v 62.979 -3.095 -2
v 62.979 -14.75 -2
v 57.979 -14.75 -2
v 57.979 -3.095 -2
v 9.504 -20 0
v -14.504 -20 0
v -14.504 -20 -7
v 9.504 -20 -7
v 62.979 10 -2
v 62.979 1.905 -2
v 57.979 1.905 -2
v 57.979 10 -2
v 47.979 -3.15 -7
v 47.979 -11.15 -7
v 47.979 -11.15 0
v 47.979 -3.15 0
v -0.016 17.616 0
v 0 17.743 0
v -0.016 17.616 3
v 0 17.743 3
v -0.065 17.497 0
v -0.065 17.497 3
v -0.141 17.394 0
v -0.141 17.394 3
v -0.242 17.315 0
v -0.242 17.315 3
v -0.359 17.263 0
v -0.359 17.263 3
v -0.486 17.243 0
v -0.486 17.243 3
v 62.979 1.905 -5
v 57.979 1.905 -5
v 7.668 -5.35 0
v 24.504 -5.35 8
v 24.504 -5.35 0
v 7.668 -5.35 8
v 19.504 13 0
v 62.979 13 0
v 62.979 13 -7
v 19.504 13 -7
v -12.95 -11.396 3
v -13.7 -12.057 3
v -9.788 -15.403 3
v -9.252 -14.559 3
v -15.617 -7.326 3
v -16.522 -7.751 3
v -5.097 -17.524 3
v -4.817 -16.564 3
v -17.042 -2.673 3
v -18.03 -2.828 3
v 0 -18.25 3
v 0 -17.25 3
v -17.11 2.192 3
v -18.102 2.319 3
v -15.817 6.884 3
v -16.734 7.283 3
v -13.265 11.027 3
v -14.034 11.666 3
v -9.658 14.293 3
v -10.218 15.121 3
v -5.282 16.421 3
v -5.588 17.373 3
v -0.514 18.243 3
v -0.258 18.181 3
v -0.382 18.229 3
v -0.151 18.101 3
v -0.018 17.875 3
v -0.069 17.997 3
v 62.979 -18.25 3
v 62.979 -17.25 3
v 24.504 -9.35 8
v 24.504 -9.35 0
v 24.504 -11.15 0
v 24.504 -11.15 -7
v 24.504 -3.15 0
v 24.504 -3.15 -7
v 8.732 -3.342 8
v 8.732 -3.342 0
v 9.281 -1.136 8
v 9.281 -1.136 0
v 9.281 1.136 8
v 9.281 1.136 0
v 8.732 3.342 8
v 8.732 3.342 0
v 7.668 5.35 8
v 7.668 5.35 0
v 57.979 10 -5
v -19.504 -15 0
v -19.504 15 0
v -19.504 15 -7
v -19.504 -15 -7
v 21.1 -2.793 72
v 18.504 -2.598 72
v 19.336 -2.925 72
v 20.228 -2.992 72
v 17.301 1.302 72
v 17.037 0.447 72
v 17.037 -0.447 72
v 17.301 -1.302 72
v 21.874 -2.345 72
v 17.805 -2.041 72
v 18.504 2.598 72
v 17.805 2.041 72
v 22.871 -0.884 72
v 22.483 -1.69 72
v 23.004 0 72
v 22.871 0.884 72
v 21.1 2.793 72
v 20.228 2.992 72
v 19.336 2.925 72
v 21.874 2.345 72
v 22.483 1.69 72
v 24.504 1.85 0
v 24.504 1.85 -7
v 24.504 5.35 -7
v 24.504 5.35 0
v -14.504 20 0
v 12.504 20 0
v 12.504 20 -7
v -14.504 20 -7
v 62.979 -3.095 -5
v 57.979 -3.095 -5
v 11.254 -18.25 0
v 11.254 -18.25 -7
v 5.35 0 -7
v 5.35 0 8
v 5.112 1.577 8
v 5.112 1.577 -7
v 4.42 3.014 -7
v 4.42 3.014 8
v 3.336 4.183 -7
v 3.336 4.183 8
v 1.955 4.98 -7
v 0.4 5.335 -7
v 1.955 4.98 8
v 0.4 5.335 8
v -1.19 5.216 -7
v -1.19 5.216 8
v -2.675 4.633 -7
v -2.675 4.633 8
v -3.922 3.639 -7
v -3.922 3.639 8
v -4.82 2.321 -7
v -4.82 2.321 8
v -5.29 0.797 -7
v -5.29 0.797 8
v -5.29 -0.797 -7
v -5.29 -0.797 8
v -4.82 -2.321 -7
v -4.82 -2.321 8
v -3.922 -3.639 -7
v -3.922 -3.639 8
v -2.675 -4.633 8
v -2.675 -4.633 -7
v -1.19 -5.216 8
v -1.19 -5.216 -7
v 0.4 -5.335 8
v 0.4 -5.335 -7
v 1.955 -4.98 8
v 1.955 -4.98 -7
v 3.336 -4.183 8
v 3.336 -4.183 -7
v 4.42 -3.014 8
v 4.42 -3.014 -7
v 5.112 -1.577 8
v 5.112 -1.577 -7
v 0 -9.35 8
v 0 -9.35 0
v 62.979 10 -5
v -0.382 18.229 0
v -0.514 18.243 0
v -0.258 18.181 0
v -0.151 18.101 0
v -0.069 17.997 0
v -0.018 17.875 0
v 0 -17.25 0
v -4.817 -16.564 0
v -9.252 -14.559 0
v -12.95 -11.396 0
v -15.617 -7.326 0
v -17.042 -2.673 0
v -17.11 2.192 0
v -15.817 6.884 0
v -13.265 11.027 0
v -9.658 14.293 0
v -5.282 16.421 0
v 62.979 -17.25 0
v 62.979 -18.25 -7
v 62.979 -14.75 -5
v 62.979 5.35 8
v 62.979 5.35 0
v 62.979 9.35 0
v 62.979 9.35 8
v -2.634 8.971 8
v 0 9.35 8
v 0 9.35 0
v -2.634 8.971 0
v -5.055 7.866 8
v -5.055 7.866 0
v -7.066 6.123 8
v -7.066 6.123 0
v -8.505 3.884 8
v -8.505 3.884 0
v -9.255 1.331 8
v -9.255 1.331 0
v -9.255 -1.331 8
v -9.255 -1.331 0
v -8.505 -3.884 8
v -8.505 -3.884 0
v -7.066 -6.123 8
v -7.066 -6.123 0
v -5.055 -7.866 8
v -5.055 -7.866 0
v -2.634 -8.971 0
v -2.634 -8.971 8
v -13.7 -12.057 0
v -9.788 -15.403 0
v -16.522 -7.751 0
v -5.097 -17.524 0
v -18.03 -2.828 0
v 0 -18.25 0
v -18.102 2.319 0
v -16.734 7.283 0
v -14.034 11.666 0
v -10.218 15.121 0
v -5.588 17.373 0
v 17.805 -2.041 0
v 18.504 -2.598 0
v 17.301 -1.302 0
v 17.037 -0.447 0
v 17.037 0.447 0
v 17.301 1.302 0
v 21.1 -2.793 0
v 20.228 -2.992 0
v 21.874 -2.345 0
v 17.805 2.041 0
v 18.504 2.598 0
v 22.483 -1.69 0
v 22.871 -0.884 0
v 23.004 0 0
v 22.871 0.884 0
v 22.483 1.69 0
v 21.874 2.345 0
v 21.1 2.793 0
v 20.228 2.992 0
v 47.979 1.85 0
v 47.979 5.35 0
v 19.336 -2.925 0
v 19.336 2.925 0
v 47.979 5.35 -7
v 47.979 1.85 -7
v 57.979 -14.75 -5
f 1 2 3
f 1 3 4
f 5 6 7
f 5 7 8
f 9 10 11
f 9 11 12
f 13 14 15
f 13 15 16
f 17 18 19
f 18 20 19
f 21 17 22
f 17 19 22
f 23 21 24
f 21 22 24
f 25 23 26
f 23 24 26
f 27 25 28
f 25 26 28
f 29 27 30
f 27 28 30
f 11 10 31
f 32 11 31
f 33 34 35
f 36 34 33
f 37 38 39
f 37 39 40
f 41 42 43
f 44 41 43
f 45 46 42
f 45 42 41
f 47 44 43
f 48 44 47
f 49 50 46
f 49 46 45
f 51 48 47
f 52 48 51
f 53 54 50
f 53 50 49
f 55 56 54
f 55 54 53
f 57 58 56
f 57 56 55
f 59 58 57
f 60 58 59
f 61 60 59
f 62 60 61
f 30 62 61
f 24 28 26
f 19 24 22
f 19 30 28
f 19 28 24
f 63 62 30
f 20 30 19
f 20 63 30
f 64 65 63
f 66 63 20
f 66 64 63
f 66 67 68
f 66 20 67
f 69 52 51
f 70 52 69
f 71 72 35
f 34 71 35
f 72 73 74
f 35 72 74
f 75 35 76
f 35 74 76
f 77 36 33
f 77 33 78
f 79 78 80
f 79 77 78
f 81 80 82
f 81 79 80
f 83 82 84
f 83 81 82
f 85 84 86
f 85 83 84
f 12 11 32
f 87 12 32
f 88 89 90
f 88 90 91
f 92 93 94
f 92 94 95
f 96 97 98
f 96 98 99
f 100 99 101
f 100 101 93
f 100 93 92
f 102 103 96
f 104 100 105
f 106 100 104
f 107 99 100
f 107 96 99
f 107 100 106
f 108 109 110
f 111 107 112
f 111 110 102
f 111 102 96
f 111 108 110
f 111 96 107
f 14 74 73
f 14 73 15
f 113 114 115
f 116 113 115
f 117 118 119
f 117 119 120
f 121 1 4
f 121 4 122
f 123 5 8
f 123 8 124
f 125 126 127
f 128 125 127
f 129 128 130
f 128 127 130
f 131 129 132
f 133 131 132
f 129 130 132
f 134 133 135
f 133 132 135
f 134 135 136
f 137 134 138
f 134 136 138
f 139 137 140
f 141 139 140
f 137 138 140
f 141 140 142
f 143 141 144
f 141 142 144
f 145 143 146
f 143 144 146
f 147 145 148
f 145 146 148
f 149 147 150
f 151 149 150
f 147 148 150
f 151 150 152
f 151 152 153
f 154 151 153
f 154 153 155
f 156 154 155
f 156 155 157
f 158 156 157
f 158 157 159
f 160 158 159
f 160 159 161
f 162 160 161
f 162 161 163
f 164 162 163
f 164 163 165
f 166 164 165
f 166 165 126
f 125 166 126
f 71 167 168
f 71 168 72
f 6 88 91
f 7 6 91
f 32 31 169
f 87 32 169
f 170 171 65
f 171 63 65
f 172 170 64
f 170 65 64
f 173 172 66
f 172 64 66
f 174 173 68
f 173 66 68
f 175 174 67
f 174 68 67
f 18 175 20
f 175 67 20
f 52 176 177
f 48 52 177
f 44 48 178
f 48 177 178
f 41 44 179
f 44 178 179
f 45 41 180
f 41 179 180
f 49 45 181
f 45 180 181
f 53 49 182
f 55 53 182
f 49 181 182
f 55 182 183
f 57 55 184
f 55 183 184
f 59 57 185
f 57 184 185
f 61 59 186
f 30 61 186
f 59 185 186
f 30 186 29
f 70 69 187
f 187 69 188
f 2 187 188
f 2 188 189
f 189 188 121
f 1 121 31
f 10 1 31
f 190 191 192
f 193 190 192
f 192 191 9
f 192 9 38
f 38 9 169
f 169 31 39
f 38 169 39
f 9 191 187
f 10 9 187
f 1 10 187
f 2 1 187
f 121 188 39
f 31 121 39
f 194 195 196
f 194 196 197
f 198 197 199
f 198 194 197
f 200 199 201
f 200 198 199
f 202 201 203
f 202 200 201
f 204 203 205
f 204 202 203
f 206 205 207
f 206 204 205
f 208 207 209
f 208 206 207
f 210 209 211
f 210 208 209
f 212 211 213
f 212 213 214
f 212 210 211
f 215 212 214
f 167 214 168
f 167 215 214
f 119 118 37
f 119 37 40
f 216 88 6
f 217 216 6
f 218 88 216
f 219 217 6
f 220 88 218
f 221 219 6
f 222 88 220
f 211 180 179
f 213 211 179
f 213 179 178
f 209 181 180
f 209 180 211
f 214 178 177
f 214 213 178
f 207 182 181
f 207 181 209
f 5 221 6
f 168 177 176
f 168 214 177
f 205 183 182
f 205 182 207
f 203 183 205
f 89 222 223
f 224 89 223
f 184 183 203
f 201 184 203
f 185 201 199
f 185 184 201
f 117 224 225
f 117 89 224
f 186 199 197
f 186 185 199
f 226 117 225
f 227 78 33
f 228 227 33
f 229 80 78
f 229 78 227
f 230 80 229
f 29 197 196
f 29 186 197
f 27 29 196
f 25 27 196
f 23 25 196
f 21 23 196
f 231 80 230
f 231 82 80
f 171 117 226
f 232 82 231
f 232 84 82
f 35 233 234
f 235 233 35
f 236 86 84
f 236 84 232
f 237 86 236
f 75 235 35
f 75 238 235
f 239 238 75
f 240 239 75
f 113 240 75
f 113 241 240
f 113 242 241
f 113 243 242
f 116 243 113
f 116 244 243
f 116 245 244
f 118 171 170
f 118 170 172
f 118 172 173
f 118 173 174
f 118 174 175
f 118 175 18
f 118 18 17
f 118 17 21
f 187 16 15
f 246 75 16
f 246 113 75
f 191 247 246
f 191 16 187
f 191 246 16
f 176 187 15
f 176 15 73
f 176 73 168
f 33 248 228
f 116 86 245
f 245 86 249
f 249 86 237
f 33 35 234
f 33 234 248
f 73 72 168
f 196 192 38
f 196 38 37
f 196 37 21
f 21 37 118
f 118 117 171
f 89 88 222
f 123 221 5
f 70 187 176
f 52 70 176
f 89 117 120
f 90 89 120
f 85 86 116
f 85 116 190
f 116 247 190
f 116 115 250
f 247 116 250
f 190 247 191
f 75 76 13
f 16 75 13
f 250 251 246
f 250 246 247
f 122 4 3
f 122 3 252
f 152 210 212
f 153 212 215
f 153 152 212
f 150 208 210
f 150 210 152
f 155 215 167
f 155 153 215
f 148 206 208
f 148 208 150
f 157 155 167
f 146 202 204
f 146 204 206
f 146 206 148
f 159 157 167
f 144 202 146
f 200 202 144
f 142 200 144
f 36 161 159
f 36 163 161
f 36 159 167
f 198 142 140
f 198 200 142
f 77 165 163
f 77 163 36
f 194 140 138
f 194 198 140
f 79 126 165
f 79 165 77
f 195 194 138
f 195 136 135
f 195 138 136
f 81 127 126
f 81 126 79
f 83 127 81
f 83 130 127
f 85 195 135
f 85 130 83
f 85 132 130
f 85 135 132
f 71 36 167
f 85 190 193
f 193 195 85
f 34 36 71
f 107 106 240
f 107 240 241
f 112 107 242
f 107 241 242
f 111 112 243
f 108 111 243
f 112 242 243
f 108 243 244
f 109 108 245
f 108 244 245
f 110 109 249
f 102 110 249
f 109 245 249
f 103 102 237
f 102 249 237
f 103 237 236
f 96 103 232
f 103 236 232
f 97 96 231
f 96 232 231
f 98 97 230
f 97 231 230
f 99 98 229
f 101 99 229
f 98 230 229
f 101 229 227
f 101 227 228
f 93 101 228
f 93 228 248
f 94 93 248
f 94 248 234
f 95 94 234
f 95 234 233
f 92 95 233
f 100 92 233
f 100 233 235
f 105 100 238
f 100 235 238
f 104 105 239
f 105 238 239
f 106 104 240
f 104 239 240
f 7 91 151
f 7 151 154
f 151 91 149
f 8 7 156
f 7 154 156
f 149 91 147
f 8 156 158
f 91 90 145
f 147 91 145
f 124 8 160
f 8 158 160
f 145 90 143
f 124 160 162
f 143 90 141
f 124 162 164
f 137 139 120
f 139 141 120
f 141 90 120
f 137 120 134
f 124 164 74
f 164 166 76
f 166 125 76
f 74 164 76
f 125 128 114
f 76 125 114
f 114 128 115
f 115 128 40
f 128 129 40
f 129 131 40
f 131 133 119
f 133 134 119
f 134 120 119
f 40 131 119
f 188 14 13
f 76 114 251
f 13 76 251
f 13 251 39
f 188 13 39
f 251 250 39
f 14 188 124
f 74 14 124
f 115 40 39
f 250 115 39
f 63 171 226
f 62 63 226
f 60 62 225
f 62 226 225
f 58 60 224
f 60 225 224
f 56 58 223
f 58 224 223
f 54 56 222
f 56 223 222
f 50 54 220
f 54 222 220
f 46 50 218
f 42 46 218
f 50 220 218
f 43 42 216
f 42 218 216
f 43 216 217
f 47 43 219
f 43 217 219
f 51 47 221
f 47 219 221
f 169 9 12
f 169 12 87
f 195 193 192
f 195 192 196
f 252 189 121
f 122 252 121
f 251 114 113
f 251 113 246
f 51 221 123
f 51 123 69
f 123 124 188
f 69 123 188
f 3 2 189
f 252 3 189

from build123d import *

# Parameters (mm, degrees)
SKETCH1_R               = 5.35
BOSS_EXTRUDE2_DEPTH     = 7
BOSS_EXTRUDE3_START     = 8
SKETCH3_R               = 5.35
BOSS_EXTRUDE3_DEPTH     = 8
BOSS_EXTRUDE4_DEPTH     = 3
CHAMFER1_SIZE           = 10
CHAMFER2_SIZE           = 5
CUT_EXTRUDE1_DEPTH      = 67.560662475
CUT_EXTRUDE1_DEPTH_BACK = 67.560662475
SKETCH5_W               = 23.474956737
SKETCH5_H               = 3.5
SKETCH5_H_2             = 8
CHAMFER3_SIZE           = 7
SKETCH6_W               = 3
SKETCH6_H               = 8.094956055
SKETCH6_H_2             = 11.655043945
CUT_EXTRUDE2_DEPTH      = 5
CUT_EXTRUDE3_REACH      = 87.249
SKETCH7_W               = 8
SKETCH7_H               = 4
SKETCH8_R               = 3
BOSS_EXTRUDE5_DEPTH     = 72
FILLET1_R               = 0.5


# Some blends are built 0.0001 mm under size
with BuildPart() as part:
    # Sketch1 → Boss-Extrude2 (new body)
    with BuildSketch(Plane.XY):
        Polygon((-19.503784034, -20), (19.503784034, -20), (19.503784034, -18.25), (62.978740771, -18.25), (62.978740771, 13), (19.503784034, 13), (19.503784034, 20), (-19.503784034, 20), align=None)
        Circle(SKETCH1_R, mode=Mode.SUBTRACT)
    extrude(amount=-BOSS_EXTRUDE2_DEPTH)

    # Sketch3 → Boss-Extrude3 (add)
    with BuildSketch(Plane.XY.offset(BOSS_EXTRUDE3_START)):
        with BuildLine():
            Line((7.668115805, 5.35), (62.978740771, 5.35))
            Line((62.978740771, 5.35), (62.978740771, 9.35))
            Line((62.978740771, 9.35), (0, 9.35))
            ThreePointArc((0, 9.35), (-9.35, 0), (0, -9.35))
            Line((0, -9.35), (62.978740771, -9.35))
            Line((62.978740771, -9.35), (62.978740771, -5.35))
            Line((62.978740771, -5.35), (7.668115805, -5.35))
            ThreePointArc((7.668115805, -5.35), (9.35, 0), (7.668115805, 5.35))
        make_face()
        Circle(SKETCH3_R, mode=Mode.SUBTRACT)
    extrude(amount=-BOSS_EXTRUDE3_DEPTH)

    # Sketch4 → Boss-Extrude4 (add)
    with BuildSketch(Plane.XY):
        with BuildLine():
            Line((0, -18.25), (62.978740771, -18.25))
            Line((62.978740771, -18.25), (62.978740771, -17.25))
            Line((62.978740771, -17.25), (8.306623863, -17.25))
            Line((8.306623863, -17.25), (0, -17.25))
            ThreePointArc((0, -17.25), (-17.25, 0), (0, 17.25))
            Line((0, 17.25), (0, 18.25))
            ThreePointArc((0, 18.25), (-18.25, 0), (0, -18.25))
        make_face()
    extrude(amount=BOSS_EXTRUDE4_DEPTH)

    # Chamfer1
    # the kernel refuses this chamfer: 10 mm, written as the material it takes off along each edge
    with BuildSketch(Plane(origin=(19.503784034, -20, 25.71682988), x_dir=(-0.9996219169112968, -0.027495876610586317, 0), z_dir=(0, 0, -1))) as chamfer1_piece_1_section:
        Polygon((CHAMFER1_SIZE * 0.999621916911, CHAMFER1_SIZE * 0.0274958766106), (-CHAMFER1_SIZE * 0.0274958766106, CHAMFER1_SIZE * 0.999621916911), (0, 0), align=None)
    chamfer1_piece_1 = extrude(amount=58.433659759, mode=Mode.PRIVATE)
    chamfer1_piece_1 = split(chamfer1_piece_1, bisect_by=Plane(origin=(14.814200223, -18.25, -3.5), z_dir=(0, -1, 0)), keep=Keep.TOP, mode=Mode.PRIVATE)
    add(chamfer1_piece_1, mode=Mode.SUBTRACT)

    # Chamfer2
    chamfer2_edges = [part.edges().sort_by_distance(p)[0] for p in [
        (-19.503784034, -20, -3.5),
        (-19.503784034, 20, -3.5),
    ]]
    chamfer(chamfer2_edges, length=CHAMFER2_SIZE)

    # Sketch5 → Cut-Extrude1 (cut, two sides: drawn at the far end of the back side and taken through both)
    with BuildSketch(Plane.XY.offset(-CUT_EXTRUDE1_DEPTH_BACK)):
        with Locations((36.241262403, 3.6)):
            Rectangle(SKETCH5_W, SKETCH5_H)
        with Locations((36.241262403, -7.15)):
            Rectangle(SKETCH5_W, SKETCH5_H_2)
    extrude(amount=CUT_EXTRUDE1_DEPTH + CUT_EXTRUDE1_DEPTH_BACK, mode=Mode.SUBTRACT)

    # Chamfer3
    chamfer3_edges = [part.edges().sort_by_distance(p)[0] for p in [
        (19.503784034, 20, -3.5),
    ]]
    chamfer(chamfer3_edges, length=CHAMFER3_SIZE - 0.0001)  # a hair under: the kernel refuses the full size

    # Sketch6 → Cut-Extrude2 (cut)
    with BuildSketch(Plane(origin=(62.978740771, 0, 0), x_dir=(0, 0, -1), z_dir=(1, 0, 0))):
        with Locations((3.5, 5.952521972)):
            Rectangle(SKETCH6_W, SKETCH6_H)
        with Locations((3.5, -8.922478028)):
            Rectangle(SKETCH6_W, SKETCH6_H_2)
    extrude(amount=-CUT_EXTRUDE2_DEPTH, mode=Mode.SUBTRACT)

    # Sketch7 → Cut-Extrude3 (cut, up to next)
    with BuildSketch(Plane(origin=(62.978740771, 0, 0), x_dir=(0, 0, -1), z_dir=(1, 0, 0)), mode=Mode.PRIVATE) as cut_extrude3_sk1:
        with Locations((-4, -7.35)):
            Rectangle(SKETCH7_W, SKETCH7_H)
    cut_extrude3_tool1 = extrude(cut_extrude3_sk1.sketch, amount=-CUT_EXTRUDE3_REACH, mode=Mode.PRIVATE) & part.part
    add(cut_extrude3_tool1.solids().sort_by_distance((62.978741, -7.35, 4))[0], mode=Mode.SUBTRACT)

    # Sketch8 → Boss-Extrude5 (add)
    with BuildSketch(Plane.XY):
        with Locations((20.003784034, 0)):
            Circle(SKETCH8_R)
    extrude(amount=BOSS_EXTRUDE5_DEPTH)

    # Fillet1
    fillet1_edges = [part.edges().sort_by_distance(p)[0] for p in [
        (0, 18.25, 1.5),
        (0, 17.25, 1.5),
    ]]
    fillet(fillet1_edges, radius=FILLET1_R - 0.0001)  # a hair under: the kernel refuses the full size


solid = part.part
